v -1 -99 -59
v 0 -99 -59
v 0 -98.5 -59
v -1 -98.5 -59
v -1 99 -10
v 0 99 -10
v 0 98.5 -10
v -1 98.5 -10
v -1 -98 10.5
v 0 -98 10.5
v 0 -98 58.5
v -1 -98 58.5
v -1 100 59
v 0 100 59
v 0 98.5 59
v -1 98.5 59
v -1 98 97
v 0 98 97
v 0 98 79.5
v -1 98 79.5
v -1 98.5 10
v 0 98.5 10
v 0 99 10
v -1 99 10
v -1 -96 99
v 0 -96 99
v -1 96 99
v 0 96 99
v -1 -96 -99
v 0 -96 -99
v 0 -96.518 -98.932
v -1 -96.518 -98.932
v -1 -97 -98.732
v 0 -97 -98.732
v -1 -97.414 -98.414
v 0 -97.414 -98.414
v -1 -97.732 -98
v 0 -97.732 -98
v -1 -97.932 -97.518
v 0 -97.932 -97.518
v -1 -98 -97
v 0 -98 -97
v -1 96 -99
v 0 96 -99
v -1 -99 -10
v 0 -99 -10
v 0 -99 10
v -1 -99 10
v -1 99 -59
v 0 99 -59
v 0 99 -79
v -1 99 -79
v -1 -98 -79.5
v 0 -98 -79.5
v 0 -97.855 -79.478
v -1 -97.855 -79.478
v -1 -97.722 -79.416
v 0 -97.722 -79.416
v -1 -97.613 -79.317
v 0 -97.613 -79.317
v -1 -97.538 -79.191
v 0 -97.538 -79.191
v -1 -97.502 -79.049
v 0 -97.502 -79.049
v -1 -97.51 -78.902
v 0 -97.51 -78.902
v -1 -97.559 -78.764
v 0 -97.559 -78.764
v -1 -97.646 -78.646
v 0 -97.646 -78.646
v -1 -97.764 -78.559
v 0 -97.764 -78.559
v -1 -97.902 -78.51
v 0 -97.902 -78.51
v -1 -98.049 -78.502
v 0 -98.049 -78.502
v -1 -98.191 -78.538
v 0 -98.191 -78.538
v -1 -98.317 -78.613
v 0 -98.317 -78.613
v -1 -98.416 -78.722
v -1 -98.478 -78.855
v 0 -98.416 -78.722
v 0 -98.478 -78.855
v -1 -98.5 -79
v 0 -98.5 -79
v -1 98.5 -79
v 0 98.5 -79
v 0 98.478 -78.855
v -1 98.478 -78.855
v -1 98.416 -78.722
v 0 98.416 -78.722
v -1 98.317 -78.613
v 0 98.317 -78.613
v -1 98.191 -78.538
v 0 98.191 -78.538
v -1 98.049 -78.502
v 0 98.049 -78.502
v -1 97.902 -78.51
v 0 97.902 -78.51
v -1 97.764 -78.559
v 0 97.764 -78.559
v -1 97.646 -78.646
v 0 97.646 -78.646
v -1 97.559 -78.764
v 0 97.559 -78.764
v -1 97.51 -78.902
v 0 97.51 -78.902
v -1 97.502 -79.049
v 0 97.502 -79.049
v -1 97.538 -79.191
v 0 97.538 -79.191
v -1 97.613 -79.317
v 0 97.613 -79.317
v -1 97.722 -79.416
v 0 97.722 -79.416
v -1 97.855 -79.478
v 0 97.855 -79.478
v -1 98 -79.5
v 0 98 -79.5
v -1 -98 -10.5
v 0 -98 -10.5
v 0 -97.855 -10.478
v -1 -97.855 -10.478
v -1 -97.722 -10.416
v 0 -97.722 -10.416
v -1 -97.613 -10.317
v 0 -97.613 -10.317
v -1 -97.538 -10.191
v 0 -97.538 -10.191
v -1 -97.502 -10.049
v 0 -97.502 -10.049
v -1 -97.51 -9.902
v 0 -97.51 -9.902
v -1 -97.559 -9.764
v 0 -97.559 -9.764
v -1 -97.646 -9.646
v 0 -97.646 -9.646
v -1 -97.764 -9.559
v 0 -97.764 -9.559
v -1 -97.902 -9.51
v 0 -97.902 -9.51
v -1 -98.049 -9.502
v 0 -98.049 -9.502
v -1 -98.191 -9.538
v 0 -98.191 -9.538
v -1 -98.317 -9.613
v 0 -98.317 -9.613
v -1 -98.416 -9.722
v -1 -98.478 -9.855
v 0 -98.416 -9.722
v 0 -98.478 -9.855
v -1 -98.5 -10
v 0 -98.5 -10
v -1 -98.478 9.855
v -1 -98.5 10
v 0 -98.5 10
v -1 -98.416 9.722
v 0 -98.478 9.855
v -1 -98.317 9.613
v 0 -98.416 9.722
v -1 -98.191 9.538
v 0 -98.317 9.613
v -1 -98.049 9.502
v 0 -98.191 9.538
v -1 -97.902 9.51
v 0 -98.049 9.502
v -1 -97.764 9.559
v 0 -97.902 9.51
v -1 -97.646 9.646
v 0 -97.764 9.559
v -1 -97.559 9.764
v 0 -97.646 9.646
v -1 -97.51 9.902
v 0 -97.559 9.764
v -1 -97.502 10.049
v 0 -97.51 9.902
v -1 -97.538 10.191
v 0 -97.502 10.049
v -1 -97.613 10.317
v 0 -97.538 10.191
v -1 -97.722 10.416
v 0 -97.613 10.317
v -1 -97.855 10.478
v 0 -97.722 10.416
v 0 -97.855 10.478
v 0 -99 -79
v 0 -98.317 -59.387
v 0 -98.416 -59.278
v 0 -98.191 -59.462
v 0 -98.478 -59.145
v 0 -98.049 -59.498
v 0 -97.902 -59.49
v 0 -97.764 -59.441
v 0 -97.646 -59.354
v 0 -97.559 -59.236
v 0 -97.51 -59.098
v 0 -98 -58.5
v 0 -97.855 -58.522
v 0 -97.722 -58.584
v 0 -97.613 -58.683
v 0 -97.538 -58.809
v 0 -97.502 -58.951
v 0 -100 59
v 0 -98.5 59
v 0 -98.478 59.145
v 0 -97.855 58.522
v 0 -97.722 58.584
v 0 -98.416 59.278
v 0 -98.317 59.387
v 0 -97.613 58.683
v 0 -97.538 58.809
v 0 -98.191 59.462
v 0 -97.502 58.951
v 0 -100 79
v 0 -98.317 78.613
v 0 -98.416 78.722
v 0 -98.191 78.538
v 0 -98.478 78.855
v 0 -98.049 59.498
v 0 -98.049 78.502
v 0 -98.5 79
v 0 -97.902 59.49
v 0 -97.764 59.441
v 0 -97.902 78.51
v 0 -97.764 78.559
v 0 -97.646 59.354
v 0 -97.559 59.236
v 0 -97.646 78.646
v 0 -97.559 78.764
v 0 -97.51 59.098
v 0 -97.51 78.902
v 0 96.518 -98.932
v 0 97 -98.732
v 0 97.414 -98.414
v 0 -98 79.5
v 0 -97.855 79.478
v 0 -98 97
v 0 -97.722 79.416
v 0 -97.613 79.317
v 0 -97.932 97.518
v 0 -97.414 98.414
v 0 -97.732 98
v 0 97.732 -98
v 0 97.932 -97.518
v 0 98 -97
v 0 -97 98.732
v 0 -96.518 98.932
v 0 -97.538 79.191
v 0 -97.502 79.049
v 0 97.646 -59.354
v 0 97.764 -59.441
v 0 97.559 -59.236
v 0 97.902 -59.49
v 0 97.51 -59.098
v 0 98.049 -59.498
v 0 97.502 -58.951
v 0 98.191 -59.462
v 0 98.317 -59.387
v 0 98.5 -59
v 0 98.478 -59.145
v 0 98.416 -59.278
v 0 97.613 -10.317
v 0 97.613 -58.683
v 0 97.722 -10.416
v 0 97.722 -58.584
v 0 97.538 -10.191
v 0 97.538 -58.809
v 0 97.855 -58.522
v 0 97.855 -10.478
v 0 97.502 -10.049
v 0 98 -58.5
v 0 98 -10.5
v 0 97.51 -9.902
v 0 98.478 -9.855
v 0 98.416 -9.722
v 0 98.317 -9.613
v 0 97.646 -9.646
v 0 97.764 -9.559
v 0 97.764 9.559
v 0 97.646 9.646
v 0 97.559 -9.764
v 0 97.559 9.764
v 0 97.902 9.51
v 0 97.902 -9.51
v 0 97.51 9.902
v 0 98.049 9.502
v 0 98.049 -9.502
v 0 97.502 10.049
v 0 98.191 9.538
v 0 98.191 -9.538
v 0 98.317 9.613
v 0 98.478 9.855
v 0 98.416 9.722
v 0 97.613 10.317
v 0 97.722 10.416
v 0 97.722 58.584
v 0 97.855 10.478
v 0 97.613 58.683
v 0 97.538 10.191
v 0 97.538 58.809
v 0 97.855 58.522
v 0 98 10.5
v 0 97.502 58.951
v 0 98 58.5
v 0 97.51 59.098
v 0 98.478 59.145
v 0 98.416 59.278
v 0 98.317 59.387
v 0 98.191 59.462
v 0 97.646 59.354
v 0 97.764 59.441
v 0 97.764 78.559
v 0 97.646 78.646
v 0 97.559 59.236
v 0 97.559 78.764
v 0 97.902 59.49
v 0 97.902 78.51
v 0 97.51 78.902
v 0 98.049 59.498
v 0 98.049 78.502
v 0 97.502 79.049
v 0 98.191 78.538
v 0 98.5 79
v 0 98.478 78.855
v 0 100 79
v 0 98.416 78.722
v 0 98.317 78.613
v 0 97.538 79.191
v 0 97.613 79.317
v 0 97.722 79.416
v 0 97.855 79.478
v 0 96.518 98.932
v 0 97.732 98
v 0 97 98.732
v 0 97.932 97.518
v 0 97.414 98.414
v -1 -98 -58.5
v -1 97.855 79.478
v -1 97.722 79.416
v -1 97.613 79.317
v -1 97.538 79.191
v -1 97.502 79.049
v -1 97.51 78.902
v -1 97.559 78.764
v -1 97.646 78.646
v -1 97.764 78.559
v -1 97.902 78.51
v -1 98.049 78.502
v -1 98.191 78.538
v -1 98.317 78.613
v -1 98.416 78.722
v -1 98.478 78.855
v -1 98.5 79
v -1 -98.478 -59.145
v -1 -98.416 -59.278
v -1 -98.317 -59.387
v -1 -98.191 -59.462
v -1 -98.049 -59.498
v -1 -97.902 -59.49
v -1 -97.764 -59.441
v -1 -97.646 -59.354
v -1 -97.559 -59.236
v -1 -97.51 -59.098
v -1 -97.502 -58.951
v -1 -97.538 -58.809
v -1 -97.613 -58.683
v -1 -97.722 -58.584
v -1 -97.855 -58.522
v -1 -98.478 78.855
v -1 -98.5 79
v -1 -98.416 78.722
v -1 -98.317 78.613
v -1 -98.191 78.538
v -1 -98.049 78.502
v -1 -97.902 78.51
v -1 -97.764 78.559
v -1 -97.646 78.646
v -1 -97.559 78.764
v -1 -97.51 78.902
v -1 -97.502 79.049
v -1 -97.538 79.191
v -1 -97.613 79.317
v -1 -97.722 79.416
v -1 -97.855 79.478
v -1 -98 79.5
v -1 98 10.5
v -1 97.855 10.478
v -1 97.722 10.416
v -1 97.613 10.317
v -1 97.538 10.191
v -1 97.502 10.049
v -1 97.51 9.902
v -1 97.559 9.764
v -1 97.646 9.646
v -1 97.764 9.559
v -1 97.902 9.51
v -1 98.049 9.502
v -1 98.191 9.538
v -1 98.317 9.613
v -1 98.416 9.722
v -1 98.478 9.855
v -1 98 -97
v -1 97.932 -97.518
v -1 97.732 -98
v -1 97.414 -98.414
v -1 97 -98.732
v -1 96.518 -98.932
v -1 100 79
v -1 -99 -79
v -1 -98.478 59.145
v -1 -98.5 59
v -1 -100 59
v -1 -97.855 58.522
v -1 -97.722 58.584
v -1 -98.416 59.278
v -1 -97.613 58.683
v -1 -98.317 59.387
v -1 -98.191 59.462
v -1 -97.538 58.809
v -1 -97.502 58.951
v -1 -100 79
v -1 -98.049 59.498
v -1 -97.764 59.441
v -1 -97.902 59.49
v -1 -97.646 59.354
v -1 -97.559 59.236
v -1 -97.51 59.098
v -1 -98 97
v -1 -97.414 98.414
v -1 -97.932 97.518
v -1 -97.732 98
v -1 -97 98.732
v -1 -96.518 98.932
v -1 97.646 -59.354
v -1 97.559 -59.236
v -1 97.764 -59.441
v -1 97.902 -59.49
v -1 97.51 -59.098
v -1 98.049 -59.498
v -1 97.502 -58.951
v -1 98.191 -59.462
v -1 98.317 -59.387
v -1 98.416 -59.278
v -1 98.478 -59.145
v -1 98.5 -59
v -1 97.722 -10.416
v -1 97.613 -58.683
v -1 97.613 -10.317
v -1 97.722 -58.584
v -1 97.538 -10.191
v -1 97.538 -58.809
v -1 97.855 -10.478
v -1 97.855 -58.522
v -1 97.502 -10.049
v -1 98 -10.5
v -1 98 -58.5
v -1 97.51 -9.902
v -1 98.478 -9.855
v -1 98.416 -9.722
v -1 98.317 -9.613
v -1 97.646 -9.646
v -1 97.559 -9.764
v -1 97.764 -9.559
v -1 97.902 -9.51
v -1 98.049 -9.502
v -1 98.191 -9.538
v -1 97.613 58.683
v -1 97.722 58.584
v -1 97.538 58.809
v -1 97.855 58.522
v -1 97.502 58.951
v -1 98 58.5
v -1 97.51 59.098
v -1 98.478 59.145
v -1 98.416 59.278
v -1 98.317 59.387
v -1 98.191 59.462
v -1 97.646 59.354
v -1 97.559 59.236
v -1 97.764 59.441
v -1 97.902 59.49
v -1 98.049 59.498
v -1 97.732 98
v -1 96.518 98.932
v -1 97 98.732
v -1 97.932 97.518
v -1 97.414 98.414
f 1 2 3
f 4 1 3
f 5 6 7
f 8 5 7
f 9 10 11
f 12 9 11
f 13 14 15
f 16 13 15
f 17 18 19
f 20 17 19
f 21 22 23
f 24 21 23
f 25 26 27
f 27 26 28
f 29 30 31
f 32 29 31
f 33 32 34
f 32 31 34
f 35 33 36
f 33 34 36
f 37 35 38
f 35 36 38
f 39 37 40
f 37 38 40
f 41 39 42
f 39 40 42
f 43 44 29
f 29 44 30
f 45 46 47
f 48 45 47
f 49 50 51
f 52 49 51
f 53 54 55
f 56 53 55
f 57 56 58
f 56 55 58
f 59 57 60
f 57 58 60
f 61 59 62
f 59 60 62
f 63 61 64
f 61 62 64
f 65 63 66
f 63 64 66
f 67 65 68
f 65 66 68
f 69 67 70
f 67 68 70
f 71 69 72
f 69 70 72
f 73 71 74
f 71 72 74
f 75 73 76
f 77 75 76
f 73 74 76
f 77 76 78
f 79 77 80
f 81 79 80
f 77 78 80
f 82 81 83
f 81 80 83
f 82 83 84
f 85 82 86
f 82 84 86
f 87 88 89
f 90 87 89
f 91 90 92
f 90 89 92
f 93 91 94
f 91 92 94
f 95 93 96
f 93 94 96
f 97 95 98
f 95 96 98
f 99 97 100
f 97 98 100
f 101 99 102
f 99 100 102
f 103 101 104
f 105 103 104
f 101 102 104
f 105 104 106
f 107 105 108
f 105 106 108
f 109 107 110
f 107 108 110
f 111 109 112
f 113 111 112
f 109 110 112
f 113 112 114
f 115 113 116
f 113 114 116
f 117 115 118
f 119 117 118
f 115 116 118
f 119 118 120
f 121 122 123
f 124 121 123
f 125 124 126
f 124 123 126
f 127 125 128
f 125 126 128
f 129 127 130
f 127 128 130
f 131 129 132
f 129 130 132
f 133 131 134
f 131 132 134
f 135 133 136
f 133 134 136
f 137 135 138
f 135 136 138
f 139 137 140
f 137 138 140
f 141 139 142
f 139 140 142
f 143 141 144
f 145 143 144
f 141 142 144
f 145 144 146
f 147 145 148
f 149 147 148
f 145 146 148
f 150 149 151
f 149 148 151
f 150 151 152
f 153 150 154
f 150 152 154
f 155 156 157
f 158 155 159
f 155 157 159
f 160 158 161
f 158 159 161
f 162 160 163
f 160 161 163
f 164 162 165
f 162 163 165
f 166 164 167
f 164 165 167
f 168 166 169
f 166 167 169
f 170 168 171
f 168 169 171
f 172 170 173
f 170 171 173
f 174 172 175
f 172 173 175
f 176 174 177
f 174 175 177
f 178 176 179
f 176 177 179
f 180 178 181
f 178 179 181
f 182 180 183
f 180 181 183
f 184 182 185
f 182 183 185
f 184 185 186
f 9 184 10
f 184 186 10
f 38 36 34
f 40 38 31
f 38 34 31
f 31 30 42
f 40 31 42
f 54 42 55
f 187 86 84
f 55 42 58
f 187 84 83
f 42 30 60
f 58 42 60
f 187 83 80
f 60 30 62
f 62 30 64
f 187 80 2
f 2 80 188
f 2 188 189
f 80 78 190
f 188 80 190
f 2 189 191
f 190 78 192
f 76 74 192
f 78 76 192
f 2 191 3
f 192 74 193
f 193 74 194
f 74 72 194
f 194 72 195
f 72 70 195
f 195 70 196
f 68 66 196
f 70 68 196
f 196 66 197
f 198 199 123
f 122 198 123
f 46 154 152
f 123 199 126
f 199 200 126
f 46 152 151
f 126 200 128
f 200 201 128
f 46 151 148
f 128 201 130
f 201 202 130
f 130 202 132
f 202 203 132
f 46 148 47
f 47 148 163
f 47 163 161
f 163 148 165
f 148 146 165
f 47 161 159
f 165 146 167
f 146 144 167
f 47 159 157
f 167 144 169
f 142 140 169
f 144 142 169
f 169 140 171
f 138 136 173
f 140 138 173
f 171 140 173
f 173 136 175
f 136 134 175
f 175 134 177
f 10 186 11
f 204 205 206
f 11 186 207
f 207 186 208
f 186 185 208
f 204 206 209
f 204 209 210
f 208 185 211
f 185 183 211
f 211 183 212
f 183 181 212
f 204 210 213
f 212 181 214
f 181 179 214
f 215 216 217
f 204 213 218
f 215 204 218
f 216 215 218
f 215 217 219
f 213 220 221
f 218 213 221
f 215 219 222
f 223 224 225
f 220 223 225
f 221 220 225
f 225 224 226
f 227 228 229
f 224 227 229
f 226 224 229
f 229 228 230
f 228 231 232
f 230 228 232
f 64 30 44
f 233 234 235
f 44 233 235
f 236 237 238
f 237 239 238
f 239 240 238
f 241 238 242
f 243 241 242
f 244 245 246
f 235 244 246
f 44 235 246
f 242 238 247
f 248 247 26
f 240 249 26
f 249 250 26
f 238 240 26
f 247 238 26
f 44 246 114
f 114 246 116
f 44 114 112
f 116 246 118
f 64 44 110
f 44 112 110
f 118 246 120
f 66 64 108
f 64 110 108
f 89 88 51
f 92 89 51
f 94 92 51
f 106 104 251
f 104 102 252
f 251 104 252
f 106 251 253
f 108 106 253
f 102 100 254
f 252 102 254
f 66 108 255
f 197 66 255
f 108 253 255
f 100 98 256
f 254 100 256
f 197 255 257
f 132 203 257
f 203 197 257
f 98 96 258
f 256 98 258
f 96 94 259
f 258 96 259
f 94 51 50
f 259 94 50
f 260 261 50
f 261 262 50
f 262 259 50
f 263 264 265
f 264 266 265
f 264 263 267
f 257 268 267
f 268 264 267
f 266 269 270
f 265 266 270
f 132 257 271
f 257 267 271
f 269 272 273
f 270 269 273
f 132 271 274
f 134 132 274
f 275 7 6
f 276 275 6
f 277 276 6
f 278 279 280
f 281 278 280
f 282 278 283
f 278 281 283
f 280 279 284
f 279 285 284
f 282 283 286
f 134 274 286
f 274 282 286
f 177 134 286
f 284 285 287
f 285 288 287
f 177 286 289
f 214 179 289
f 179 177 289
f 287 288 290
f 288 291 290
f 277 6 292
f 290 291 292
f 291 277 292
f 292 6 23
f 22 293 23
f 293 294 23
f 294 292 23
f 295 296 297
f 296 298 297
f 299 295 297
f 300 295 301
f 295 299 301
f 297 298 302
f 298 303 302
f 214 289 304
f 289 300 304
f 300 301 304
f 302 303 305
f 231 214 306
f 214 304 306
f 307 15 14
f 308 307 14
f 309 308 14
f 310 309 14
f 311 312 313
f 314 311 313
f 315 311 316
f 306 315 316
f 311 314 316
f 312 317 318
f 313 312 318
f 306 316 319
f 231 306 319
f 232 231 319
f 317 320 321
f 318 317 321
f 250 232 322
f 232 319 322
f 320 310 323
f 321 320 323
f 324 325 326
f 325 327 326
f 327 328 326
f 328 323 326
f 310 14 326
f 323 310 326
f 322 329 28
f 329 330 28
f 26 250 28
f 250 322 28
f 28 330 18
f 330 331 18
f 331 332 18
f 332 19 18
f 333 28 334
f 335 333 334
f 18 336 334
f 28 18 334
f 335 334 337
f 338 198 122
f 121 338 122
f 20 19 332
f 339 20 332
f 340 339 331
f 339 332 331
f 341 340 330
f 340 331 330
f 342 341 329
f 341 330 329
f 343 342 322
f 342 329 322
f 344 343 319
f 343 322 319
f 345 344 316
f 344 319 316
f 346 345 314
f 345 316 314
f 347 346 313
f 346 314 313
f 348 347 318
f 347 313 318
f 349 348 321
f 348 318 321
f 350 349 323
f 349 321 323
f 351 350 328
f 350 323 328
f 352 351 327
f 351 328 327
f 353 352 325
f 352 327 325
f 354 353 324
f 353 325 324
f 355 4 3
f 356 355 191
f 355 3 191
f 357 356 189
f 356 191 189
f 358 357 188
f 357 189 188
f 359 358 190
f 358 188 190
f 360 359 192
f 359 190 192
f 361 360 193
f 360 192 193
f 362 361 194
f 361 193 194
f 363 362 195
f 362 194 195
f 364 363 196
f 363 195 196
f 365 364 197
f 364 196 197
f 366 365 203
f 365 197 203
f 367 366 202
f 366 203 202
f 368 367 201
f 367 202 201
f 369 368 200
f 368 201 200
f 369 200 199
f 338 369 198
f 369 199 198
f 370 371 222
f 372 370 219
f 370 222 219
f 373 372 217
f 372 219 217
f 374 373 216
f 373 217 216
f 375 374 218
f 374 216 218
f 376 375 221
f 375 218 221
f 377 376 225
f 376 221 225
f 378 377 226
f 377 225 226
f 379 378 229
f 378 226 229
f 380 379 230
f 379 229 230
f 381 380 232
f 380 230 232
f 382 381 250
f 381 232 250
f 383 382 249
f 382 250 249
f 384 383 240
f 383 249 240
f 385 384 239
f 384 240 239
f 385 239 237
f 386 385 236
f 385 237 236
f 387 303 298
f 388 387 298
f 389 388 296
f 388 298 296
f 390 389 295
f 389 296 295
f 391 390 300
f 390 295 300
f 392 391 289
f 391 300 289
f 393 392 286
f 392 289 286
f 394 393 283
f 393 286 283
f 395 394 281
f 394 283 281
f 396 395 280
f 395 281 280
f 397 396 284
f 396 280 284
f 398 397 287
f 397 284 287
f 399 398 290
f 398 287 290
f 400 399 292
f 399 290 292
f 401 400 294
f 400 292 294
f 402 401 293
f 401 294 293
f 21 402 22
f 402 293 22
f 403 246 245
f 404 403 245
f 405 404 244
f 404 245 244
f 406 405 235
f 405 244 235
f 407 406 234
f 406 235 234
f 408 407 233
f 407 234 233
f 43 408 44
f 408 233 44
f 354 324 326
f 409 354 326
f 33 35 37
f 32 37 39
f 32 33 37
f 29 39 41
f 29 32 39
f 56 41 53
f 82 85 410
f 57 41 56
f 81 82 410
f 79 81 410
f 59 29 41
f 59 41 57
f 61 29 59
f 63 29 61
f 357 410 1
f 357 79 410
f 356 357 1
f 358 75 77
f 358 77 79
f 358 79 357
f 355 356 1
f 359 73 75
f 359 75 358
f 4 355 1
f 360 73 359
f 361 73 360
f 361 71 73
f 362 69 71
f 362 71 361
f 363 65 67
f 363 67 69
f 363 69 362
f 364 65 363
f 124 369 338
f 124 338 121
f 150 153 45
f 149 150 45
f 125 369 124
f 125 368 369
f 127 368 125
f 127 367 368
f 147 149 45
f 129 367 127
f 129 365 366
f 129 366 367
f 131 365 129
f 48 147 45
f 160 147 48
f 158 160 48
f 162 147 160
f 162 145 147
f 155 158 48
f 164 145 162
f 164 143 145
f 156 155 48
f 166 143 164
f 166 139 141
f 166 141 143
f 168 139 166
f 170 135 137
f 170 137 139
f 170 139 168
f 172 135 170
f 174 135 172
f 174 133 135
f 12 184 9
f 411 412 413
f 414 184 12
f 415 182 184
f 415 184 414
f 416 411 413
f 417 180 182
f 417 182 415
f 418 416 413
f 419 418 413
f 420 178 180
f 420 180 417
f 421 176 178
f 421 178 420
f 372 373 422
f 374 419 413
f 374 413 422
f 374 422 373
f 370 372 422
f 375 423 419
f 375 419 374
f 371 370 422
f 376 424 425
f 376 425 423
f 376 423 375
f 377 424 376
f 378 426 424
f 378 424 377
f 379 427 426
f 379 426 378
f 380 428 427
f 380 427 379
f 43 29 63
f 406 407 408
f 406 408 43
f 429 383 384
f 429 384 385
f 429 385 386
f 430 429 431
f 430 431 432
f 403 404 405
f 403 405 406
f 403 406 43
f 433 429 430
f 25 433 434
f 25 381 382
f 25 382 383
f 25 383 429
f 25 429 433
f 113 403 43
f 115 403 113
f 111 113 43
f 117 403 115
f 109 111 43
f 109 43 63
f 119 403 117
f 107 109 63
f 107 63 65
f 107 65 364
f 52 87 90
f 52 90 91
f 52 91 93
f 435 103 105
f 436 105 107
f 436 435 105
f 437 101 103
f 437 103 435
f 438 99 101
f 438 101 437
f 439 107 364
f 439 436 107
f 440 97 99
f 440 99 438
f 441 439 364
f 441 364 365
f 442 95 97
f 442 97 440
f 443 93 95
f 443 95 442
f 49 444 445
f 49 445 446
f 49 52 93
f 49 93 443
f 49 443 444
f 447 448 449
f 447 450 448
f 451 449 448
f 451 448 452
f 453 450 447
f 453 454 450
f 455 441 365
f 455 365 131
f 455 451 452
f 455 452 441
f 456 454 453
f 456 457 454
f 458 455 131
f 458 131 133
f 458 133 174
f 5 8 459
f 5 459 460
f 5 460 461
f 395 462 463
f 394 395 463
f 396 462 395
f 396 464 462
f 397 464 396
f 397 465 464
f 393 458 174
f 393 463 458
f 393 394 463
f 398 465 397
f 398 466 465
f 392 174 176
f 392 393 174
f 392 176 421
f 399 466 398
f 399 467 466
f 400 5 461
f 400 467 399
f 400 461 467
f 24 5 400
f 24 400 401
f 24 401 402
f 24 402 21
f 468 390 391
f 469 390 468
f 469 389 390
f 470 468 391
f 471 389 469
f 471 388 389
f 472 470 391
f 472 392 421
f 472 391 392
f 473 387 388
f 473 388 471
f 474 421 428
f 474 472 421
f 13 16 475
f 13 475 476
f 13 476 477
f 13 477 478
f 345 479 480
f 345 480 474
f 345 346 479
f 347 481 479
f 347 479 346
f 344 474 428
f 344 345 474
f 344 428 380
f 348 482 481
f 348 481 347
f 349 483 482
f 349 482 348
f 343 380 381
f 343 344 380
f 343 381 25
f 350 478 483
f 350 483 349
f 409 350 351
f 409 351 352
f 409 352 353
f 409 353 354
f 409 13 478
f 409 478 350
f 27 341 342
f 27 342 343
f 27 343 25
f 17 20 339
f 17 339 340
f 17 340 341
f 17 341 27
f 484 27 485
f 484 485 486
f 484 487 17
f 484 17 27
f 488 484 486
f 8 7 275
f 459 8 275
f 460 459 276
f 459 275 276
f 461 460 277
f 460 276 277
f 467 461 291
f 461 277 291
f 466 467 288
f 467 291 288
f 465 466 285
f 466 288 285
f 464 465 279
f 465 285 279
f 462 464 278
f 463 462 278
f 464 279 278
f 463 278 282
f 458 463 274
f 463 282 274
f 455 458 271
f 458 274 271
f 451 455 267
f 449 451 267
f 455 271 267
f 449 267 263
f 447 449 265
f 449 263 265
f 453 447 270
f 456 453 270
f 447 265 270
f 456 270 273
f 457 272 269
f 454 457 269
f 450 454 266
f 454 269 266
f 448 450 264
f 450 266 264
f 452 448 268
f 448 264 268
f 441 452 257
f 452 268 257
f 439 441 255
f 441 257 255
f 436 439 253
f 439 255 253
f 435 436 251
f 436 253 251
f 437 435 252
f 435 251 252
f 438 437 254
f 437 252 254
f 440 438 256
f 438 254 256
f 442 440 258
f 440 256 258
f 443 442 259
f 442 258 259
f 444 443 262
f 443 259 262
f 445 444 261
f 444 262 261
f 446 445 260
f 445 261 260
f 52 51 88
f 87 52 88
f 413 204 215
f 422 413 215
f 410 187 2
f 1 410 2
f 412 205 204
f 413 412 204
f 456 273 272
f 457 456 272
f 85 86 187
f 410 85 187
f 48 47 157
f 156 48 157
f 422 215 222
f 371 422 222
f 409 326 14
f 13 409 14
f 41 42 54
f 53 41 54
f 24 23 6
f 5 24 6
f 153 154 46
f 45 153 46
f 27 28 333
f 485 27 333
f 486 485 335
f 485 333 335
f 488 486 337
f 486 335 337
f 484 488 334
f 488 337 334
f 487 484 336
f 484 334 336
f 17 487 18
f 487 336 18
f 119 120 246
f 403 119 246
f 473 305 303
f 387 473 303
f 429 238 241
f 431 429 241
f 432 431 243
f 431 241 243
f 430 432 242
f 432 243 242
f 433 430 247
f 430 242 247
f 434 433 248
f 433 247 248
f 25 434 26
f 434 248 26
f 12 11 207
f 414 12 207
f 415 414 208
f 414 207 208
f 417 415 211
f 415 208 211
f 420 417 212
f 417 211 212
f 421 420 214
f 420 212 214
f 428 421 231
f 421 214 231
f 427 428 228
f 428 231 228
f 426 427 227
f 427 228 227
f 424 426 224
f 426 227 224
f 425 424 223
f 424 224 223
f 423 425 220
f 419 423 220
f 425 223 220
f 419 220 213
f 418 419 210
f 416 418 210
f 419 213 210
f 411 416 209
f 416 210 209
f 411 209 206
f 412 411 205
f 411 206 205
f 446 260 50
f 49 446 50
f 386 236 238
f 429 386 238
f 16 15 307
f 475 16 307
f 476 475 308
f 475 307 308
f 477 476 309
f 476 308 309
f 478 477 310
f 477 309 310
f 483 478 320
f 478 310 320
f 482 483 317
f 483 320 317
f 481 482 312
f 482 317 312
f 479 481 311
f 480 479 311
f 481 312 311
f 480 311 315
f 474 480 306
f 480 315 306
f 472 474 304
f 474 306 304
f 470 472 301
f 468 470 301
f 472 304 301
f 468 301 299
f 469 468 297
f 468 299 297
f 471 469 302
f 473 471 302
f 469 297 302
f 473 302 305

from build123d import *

# Parameters (mm, degrees)
T_LE_DE_BASE_PLI_E1_DEPTH = 1
ESQUISSE3_R               = 0.5
ENL_V_MAT_EXTRU_1_DEPTH   = 141.719579306


# Sheet-metal steps are written as plain solids
with BuildPart() as part:
    # Esquisse1 → Tôle de base pliée1 (new body)
    with BuildSketch(Plane(origin=(0, 0, 0), x_dir=(0, 0, -1), z_dir=(1, 0, 0))):
        with BuildLine():
            Line((-99, -96), (-99, 96))
            ThreePointArc((-99, 96), (-98.414213562, 97.414213562), (-97, 98))
            Line((-97, 98), (-79, 98))
            Line((-79, 98), (-79, 100))
            Line((-79, 100), (-59, 100))
            Line((-59, 100), (-59, 98))
            Line((-59, 98), (-10, 98))
            Line((-10, 98), (-10, 99))
            Line((-10, 99), (10, 99))
            Line((10, 99), (10, 98))
            Line((10, 98), (59, 98))
            Line((59, 98), (59, 99))
            Line((59, 99), (79, 99))
            Line((79, 99), (79, 98))
            Line((79, 98), (97, 98))
            ThreePointArc((97, 98), (98.414213562, 97.414213562), (99, 96))
            Line((99, 96), (99, -96))
            ThreePointArc((99, -96), (98.414213562, -97.414213562), (97, -98))
            Line((97, -98), (79, -98))
            Line((79, -98), (79, -99))
            Line((79, -99), (59, -99))
            Line((59, -99), (59, -98))
            Line((59, -98), (10, -98))
            Line((10, -98), (10, -99))
            Line((10, -99), (-10, -99))
            Line((-10, -99), (-10, -98))
            Line((-10, -98), (-59, -98))
            Line((-59, -98), (-59, -100))
            Line((-59, -100), (-79, -100))
            Line((-79, -100), (-79, -98))
            Line((-79, -98), (-97, -98))
            ThreePointArc((-97, -98), (-98.414213562, -97.414213562), (-99, -96))
        make_face()
    extrude(amount=-T_LE_DE_BASE_PLI_E1_DEPTH)

    # Esquisse3 → Enlèv. mat.-Extru.1 (cut, through all)
    with BuildSketch(Plane(origin=(0, 0, 0), x_dir=(0, 0, -1), z_dir=(1, 0, 0))):
        with Locations((-79, 98)):
            Circle(ESQUISSE3_R)
        with Locations((-59, 98)):
            Circle(ESQUISSE3_R)
        with Locations((-10, 98)):
            Circle(ESQUISSE3_R)
        with Locations((10, 98)):
            Circle(ESQUISSE3_R)
        with Locations((59, 98)):
            Circle(ESQUISSE3_R)
        with Locations((79, 98)):
            Circle(ESQUISSE3_R)
        with Locations((79, -98)):
            Circle(ESQUISSE3_R)
        with Locations((59, -98)):
            Circle(ESQUISSE3_R)
        with Locations((10, -98)):
            Circle(ESQUISSE3_R)
        with Locations((-10, -98)):
            Circle(ESQUISSE3_R)
        with Locations((-59, -98)):
            Circle(ESQUISSE3_R)
        with Locations((-79, -98)):
            Circle(ESQUISSE3_R)
    extrude(amount=-ENL_V_MAT_EXTRU_1_DEPTH, mode=Mode.SUBTRACT)


solid = part.part
